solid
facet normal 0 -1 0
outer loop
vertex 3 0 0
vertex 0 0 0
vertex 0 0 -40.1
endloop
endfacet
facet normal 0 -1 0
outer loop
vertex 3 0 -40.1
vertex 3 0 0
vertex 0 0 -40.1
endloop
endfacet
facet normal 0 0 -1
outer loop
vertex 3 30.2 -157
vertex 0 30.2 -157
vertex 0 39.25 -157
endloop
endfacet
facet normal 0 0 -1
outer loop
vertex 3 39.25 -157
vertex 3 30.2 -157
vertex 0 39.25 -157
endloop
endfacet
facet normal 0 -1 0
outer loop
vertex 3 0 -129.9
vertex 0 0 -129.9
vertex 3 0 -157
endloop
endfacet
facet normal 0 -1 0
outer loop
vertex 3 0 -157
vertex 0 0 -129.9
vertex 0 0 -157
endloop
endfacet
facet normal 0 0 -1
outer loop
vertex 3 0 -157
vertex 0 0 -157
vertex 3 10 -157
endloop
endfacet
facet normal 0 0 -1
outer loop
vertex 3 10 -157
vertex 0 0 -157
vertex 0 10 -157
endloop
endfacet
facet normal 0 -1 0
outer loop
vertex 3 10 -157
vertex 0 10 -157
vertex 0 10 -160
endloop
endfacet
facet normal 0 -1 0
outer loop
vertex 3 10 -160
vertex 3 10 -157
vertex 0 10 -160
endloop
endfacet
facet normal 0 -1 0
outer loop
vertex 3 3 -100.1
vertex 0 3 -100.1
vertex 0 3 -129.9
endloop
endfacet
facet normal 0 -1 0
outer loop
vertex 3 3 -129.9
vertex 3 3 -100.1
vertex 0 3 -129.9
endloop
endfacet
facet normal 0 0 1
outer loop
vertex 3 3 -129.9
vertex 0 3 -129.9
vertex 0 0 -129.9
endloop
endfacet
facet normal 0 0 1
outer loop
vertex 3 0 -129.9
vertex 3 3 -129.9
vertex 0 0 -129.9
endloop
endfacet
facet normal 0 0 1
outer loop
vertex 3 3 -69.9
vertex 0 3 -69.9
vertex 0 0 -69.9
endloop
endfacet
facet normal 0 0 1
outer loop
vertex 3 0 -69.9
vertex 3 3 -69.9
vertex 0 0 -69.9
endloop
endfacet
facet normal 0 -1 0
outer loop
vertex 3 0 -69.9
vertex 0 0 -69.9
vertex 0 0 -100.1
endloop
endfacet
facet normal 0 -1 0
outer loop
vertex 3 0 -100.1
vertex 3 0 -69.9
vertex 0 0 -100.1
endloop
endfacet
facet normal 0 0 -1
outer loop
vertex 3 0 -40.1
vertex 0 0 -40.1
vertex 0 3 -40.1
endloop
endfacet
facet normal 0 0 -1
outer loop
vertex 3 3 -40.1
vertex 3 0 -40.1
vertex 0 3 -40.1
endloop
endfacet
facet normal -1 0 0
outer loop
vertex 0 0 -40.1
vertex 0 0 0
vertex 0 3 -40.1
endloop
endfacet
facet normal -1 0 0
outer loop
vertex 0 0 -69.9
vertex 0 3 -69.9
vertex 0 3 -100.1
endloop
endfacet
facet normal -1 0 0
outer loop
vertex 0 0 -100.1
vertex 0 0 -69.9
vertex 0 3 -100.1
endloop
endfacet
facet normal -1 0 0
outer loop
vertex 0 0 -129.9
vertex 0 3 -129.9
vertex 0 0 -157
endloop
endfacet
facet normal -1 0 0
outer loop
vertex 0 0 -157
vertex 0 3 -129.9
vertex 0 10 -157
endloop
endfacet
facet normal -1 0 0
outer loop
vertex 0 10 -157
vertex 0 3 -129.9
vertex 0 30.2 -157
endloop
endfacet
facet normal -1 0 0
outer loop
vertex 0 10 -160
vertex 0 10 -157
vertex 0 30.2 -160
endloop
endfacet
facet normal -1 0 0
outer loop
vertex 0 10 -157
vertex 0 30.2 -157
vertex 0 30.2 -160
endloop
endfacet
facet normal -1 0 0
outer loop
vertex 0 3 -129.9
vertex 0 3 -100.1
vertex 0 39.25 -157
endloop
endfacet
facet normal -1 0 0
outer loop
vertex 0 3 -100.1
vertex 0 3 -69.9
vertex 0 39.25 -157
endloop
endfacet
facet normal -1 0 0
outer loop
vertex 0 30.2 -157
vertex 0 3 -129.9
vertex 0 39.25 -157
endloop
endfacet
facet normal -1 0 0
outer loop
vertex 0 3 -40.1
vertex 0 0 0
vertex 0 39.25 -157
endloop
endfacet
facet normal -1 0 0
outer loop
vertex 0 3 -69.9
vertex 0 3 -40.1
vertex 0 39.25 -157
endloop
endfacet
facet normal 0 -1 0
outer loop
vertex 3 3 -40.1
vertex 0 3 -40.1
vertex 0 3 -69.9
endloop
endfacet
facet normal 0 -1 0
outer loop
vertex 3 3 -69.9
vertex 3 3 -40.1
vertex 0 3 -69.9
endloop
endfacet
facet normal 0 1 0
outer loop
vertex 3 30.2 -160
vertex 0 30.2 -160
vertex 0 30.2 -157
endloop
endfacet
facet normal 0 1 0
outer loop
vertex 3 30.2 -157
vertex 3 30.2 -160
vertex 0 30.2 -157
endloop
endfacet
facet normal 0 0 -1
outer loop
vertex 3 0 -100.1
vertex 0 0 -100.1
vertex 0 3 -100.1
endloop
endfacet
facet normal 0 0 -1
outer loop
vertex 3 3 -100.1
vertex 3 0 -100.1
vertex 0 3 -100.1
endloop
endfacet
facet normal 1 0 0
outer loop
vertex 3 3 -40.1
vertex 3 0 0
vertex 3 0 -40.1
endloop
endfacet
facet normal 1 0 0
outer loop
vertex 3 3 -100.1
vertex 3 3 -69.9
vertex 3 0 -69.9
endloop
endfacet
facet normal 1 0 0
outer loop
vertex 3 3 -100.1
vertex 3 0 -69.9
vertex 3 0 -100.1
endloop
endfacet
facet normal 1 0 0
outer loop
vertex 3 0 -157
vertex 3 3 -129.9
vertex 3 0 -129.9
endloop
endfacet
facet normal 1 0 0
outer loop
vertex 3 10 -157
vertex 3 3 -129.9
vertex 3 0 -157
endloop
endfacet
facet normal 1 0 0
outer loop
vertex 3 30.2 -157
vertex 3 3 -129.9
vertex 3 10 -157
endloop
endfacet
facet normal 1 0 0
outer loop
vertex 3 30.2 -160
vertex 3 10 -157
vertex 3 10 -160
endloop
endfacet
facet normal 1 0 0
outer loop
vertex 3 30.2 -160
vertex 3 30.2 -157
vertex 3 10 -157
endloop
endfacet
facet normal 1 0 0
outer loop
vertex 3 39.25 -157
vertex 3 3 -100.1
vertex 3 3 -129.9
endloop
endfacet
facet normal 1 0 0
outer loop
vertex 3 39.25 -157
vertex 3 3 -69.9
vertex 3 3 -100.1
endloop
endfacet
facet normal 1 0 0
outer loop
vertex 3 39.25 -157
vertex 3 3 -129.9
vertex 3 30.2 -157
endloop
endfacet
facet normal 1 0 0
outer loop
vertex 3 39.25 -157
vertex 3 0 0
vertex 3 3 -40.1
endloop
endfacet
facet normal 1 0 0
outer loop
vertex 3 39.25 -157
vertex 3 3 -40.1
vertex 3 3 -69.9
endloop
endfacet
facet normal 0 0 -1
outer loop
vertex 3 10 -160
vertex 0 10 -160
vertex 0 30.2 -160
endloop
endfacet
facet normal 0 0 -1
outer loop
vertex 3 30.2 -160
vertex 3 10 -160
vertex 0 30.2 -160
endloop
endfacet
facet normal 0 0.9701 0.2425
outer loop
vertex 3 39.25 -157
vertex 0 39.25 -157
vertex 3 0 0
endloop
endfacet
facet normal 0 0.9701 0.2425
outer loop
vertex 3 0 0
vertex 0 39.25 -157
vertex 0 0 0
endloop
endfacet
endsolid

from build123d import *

# Parameters (mm, degrees)
BOSS_EXTRUDE1_DEPTH = 3


with BuildPart() as part:
    # Sketch2 → Boss-Extrude1 (new body)
    with BuildSketch(Plane(origin=(0, 0, 0), x_dir=(0, 0, -1), z_dir=(1, 0, 0))):
        Polygon((157, 39.25), (0, 0), (40.1, 0), (40.1, 3), (69.9, 3), (69.9, 0), (100.1, 0), (100.1, 3), (129.9, 3), (129.9, 0), (157, 0), (157, 10), (160, 10), (160, 30.2), (157, 30.2), align=None)
    extrude(amount=BOSS_EXTRUDE1_DEPTH)


solid = part.part
